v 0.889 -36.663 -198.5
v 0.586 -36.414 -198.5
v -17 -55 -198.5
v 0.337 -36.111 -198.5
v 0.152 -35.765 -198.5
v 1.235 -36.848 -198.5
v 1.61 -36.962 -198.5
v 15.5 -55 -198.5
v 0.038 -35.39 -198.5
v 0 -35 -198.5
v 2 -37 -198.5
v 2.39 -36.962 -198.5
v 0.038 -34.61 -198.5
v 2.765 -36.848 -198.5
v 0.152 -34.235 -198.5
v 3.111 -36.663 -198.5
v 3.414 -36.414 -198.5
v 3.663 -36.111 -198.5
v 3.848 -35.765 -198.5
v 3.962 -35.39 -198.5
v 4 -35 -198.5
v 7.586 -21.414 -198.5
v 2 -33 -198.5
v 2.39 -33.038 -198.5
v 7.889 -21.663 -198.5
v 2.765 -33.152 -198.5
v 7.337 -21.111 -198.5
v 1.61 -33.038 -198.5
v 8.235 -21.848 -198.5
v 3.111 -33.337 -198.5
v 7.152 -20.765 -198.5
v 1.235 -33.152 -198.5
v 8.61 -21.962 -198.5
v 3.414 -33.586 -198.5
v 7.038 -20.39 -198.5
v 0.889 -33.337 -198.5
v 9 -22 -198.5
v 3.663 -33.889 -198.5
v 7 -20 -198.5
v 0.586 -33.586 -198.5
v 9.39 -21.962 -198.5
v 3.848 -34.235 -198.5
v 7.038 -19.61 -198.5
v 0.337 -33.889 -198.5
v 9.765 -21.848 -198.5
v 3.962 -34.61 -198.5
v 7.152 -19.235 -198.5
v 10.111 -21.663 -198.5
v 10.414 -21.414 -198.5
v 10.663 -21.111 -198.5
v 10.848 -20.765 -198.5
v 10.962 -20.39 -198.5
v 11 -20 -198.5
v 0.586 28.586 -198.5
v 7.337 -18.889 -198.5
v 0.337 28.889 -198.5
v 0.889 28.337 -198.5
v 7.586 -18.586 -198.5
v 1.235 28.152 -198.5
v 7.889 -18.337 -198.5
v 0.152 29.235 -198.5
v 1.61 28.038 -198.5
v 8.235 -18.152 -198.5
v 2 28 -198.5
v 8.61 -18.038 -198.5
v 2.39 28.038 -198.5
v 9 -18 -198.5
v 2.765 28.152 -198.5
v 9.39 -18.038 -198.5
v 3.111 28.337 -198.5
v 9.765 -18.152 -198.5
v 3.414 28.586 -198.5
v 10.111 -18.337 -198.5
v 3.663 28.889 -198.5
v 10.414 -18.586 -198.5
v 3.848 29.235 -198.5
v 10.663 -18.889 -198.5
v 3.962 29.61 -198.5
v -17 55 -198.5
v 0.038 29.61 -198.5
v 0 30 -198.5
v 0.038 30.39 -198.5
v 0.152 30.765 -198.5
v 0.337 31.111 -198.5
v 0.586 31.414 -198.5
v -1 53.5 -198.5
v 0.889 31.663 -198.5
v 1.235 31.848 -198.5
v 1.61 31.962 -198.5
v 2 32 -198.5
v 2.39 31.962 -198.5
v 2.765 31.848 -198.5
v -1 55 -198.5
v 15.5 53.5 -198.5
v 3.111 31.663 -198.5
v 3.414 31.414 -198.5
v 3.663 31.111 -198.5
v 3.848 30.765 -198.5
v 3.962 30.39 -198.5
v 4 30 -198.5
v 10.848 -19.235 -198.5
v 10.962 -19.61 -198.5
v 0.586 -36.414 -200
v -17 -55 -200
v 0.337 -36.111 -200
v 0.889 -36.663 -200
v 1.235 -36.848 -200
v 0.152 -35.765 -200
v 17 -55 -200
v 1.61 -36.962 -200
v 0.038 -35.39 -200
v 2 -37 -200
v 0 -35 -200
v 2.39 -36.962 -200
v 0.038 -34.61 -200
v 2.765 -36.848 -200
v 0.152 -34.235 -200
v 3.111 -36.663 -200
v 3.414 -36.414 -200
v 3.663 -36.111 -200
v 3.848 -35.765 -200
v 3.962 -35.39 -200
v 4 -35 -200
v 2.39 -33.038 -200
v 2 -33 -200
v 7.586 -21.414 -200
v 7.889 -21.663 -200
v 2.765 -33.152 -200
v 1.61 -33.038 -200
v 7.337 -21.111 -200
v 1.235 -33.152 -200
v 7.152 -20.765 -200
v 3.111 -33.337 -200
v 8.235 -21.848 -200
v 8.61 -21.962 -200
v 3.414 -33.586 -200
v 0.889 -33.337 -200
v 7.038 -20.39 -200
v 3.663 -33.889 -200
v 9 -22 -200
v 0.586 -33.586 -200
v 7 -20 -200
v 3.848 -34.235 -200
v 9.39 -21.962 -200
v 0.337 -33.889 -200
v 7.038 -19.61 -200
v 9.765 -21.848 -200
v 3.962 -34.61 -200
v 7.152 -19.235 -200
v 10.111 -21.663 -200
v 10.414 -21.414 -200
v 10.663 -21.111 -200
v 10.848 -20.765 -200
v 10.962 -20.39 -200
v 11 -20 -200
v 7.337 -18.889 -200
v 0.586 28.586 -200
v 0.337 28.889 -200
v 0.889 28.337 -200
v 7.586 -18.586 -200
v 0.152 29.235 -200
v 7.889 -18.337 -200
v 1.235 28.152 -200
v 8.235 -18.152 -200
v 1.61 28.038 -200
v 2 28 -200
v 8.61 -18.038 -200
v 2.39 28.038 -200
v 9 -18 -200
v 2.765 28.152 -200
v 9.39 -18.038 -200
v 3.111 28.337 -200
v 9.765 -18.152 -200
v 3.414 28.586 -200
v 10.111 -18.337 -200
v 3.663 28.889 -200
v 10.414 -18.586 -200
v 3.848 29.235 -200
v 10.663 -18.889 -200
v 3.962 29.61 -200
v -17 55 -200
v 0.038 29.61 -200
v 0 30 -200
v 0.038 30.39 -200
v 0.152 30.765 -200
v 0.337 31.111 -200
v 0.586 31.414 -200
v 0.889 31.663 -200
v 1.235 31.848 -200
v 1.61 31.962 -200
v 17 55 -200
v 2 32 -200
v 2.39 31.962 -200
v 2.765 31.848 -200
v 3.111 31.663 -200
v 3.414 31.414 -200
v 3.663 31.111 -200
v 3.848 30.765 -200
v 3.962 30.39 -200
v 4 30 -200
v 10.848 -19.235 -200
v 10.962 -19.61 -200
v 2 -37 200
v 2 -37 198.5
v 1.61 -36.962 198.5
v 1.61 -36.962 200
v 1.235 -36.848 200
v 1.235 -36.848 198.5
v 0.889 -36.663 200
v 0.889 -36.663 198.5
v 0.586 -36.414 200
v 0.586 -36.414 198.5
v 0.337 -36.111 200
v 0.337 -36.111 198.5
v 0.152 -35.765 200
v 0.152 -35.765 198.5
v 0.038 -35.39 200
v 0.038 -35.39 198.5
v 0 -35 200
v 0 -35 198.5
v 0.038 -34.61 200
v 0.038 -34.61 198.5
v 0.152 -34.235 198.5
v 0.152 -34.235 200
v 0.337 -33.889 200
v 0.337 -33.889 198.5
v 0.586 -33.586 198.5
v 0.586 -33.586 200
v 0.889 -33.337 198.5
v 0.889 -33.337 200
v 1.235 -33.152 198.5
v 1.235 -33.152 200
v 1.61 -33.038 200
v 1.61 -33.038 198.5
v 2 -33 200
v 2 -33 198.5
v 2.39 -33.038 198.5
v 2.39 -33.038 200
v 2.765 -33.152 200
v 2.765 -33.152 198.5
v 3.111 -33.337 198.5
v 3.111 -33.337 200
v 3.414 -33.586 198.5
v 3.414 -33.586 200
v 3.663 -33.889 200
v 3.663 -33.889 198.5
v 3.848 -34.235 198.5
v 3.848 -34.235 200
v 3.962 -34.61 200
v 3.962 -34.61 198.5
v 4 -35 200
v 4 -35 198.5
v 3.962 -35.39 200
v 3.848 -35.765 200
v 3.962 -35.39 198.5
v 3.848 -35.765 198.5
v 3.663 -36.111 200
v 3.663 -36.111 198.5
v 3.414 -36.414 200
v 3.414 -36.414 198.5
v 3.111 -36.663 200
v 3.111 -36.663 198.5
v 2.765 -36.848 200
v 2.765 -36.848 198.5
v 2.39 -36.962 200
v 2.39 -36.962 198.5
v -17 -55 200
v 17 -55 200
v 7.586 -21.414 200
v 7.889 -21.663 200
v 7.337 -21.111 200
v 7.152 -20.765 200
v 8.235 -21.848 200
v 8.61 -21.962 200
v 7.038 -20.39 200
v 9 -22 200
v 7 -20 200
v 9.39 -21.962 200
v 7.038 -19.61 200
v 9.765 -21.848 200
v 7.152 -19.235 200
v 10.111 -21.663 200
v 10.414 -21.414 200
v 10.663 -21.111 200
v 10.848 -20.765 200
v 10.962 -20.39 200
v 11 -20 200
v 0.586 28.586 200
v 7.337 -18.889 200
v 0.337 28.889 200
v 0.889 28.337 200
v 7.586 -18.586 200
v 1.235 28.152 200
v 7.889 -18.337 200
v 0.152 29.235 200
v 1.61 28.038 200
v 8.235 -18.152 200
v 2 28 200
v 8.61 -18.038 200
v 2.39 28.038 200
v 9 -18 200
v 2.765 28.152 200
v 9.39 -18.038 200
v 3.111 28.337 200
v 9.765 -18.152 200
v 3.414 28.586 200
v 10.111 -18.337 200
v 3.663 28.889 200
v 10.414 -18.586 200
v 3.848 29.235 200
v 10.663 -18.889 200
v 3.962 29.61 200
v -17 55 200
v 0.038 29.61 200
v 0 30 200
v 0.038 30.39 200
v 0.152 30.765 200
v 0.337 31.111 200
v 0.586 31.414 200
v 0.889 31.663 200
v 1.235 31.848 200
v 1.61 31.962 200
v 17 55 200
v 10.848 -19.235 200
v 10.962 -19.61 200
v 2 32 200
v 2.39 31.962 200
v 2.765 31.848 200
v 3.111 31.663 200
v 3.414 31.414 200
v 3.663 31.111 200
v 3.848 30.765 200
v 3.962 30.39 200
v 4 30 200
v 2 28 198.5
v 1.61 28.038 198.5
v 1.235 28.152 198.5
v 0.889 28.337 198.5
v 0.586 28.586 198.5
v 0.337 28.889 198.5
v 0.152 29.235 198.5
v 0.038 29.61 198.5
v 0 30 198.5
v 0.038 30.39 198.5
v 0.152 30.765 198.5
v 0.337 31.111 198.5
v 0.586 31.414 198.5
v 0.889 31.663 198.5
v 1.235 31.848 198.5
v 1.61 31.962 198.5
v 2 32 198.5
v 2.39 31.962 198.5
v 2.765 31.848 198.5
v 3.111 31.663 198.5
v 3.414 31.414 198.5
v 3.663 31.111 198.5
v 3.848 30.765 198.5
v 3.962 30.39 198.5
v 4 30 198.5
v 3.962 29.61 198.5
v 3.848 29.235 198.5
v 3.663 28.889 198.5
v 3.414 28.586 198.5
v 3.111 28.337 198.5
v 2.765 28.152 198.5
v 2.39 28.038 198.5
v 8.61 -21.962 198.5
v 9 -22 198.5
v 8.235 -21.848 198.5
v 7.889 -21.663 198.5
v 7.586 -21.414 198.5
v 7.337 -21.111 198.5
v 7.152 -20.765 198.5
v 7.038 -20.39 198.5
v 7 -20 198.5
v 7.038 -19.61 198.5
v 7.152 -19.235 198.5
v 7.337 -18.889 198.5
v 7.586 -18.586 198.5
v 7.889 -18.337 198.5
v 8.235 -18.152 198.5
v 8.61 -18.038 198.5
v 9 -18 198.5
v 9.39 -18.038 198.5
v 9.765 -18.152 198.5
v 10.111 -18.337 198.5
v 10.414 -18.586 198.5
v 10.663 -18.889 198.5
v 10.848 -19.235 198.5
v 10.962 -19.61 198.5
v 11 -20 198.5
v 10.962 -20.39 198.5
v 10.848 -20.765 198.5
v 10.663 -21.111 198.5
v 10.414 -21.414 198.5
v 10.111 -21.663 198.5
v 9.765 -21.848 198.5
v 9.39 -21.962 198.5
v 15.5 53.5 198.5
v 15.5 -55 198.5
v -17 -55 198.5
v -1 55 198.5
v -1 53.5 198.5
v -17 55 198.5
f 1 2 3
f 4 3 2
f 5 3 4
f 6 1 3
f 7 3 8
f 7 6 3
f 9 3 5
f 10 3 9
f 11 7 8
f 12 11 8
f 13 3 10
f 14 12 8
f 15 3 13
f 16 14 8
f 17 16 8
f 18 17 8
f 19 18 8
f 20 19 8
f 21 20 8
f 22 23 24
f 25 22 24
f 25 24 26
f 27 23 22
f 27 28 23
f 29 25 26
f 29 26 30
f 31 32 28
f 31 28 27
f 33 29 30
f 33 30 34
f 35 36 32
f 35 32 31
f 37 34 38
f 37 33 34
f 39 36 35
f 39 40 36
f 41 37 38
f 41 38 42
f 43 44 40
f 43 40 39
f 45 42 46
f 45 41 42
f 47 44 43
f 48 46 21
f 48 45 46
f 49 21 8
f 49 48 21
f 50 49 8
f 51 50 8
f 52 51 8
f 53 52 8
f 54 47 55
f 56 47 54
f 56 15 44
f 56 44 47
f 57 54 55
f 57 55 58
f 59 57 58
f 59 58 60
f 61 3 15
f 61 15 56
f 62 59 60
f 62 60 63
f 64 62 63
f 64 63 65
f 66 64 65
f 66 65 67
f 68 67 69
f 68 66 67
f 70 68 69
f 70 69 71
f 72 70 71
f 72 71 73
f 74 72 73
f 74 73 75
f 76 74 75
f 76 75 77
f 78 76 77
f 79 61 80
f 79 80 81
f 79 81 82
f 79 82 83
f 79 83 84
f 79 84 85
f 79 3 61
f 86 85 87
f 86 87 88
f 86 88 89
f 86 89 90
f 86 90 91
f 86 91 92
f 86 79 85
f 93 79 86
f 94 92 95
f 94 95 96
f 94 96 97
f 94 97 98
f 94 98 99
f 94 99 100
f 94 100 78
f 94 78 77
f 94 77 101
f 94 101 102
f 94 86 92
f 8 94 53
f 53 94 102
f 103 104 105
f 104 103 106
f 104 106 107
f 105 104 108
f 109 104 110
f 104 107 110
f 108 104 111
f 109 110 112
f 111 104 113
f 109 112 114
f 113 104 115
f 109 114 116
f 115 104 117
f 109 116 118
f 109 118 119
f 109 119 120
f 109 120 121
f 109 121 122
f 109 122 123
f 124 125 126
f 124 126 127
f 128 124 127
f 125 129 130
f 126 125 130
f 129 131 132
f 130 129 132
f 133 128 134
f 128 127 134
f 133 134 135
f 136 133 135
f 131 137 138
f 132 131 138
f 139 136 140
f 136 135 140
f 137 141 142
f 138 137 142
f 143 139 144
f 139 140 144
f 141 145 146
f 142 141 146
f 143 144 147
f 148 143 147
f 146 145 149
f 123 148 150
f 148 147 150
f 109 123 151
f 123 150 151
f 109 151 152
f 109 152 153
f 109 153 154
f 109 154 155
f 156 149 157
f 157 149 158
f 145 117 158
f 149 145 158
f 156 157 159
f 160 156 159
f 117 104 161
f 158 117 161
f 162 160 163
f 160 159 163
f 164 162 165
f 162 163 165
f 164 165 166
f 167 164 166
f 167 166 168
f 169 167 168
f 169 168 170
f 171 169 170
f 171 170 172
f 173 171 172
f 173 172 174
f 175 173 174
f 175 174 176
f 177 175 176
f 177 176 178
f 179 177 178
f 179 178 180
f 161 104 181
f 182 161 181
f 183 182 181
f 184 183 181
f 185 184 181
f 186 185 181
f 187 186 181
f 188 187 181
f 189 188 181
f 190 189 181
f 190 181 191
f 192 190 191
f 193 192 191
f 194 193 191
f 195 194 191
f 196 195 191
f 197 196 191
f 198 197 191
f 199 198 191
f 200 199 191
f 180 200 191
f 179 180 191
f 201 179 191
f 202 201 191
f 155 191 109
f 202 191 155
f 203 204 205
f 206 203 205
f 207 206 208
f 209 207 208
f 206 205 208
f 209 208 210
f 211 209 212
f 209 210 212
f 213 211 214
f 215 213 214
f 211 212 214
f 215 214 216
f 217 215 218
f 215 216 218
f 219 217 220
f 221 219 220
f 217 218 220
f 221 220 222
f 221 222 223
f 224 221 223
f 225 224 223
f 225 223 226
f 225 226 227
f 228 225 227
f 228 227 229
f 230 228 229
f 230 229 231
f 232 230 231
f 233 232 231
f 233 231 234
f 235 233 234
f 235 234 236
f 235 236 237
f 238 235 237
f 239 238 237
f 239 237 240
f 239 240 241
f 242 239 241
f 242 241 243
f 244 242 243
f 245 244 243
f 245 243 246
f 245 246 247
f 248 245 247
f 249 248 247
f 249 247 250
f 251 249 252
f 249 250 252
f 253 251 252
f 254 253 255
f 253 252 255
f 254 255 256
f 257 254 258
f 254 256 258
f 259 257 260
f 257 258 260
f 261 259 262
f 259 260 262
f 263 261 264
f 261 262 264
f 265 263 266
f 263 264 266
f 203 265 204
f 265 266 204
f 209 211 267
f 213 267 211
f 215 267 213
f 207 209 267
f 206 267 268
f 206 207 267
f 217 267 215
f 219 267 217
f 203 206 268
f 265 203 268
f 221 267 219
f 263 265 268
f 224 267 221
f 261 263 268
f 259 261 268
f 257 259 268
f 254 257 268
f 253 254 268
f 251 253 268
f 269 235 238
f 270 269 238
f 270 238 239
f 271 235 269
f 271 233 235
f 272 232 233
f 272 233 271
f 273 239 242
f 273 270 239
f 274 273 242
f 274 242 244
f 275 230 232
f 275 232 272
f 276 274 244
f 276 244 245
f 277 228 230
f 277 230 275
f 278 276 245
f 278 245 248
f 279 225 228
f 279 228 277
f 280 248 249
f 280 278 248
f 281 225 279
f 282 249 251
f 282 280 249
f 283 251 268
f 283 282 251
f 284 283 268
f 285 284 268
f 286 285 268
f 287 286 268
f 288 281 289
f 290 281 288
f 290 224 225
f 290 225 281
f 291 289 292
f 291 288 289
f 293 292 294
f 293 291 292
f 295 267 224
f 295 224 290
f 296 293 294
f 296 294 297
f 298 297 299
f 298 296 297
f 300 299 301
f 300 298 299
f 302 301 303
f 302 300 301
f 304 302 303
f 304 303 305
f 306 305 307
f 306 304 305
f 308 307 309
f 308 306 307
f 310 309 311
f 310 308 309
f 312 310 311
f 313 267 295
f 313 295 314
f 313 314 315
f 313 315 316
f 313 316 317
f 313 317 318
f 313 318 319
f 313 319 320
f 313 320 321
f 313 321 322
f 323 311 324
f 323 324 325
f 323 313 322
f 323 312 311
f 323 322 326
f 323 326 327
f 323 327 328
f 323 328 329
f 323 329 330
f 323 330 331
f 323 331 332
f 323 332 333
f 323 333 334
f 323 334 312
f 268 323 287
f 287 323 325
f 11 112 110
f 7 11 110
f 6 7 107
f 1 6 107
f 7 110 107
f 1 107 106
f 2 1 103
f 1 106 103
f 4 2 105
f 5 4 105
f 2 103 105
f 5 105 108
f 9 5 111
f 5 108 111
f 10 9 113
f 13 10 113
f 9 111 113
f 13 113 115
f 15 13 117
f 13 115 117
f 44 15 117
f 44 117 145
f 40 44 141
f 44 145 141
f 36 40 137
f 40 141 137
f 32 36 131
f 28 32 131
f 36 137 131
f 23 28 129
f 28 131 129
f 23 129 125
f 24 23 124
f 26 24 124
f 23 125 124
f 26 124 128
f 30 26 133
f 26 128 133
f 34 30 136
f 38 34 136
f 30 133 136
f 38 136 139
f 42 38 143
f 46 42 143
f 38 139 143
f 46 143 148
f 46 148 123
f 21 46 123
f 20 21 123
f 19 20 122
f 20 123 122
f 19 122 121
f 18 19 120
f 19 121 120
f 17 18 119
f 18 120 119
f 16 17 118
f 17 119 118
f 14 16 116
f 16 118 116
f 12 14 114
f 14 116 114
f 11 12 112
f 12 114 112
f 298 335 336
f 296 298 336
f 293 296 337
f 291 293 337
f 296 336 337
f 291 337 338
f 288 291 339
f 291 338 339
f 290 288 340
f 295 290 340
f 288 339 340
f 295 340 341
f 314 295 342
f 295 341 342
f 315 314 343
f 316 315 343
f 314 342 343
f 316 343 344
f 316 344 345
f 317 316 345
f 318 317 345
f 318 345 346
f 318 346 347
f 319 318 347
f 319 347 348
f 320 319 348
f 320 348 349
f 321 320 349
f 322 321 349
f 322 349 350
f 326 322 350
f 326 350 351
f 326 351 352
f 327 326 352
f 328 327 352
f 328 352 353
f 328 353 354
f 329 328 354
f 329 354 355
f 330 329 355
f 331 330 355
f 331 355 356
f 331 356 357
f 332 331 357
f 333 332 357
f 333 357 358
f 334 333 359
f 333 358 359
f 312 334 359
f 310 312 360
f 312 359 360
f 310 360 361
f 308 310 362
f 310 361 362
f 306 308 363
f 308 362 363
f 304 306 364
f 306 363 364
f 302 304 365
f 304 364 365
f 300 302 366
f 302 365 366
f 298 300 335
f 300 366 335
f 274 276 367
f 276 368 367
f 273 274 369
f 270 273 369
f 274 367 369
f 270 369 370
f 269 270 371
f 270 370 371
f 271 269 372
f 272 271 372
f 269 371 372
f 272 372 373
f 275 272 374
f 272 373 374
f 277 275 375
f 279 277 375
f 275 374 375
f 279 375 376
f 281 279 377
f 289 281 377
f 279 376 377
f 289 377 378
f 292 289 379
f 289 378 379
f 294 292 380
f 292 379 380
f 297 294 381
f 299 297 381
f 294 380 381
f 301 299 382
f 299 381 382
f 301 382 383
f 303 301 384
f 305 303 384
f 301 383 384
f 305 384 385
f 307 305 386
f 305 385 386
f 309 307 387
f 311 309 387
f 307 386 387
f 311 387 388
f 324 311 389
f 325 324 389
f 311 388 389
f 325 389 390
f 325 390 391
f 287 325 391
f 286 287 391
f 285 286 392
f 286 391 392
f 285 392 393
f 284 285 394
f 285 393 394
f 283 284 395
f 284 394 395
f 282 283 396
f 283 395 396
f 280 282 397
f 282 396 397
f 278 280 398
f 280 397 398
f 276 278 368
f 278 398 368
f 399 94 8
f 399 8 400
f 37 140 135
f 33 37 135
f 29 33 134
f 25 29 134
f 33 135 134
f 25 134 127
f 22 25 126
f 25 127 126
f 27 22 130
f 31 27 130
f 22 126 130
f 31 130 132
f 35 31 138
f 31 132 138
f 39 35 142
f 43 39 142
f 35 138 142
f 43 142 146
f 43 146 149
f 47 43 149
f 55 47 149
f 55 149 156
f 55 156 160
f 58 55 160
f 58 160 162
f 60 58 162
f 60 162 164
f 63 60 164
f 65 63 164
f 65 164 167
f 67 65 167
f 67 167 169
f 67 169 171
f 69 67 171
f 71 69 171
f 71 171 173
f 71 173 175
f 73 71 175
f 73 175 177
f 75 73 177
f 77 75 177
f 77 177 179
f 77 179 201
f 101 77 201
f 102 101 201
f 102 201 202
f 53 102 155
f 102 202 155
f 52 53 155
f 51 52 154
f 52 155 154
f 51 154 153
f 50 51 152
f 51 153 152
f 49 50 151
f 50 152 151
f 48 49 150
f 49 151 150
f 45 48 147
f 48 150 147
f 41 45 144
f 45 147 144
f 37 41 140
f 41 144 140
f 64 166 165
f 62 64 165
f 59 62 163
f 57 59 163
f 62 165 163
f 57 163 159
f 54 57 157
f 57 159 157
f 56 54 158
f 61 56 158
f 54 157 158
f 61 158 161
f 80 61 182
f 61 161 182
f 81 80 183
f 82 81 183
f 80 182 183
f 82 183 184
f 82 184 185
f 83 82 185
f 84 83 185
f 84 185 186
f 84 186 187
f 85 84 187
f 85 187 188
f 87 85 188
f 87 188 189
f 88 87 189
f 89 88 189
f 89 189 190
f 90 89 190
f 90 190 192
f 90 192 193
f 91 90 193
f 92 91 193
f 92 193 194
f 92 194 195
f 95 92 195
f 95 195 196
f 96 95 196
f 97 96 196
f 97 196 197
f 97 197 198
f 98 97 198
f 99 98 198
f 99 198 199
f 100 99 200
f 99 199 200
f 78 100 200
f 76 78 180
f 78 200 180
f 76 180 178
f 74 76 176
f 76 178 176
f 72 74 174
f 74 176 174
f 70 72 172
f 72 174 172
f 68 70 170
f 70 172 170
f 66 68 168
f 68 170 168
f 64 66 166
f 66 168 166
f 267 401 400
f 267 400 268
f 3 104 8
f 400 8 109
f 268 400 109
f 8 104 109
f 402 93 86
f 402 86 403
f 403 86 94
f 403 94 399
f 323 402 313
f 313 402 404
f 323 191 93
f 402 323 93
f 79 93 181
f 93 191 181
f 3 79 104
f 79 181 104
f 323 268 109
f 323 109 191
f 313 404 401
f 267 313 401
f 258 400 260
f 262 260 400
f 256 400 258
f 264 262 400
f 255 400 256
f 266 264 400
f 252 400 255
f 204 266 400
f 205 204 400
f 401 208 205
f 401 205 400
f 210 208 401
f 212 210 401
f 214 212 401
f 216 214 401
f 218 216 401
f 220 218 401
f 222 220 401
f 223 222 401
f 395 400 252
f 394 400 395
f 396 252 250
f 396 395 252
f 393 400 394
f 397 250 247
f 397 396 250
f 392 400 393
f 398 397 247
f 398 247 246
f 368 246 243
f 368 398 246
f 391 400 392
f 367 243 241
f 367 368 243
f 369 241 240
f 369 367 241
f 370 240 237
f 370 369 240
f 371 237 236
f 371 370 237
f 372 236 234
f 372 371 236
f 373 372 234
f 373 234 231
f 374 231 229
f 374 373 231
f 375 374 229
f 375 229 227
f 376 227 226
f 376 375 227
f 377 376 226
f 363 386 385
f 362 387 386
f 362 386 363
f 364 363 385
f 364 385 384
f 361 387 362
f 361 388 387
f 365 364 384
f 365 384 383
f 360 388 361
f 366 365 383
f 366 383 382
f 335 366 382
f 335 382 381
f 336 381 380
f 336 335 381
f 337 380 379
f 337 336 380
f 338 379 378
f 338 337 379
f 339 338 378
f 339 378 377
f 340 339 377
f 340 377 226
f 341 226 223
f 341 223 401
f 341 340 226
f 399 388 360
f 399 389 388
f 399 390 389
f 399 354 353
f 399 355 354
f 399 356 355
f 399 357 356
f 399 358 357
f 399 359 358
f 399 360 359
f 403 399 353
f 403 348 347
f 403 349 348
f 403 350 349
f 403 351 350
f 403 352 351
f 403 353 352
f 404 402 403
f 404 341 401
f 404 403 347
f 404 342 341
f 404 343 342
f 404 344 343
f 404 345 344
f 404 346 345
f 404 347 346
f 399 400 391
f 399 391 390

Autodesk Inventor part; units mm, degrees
ref_plane "YZ Plane" through (0, 0, 0) normal (1, 0, 0) x (0, 1, 0)
ref_plane "XZ Plane" through (0, 0, 0) normal (0, 1, 0) x (-1, 0, 0)
ref_plane "XY Plane" through (0, 0, 0) normal (0, 0, 1) x (1, 0, 0)
sketch "Skizze1" plane through (0, 0, 0) normal (0, 0, 1) x (1, 0, 0)
  line L0 (-17, -55) -> (17, -55)
  line L1 (17, -55) -> (17, 55)
  line L2 (17, 55) -> (-17, 55)
  line L3 (-17, 55) -> (-17, -55)
  line L4 (-17, 55) -> (17, -55) construction
  line L5 (-17, -55) -> (17, 55) construction
  point P0 (0, 0)
  point P1 (0, 0)
  dimension "d0" = 34
  dimension "d2" = 110
extrude "Extrusion1" add sketch "Skizze1" along normal mid plane 400
sketch "Skizze2" plane through (0, 0, 200) normal (0, 0, 1) x (1, 0, 0)
  line L0 (-17, -55) -> (17, -55) projected
  line L1 (17, -55) -> (17, 55) projected
  line L2 (17, 55) -> (-17, 55) projected
  point P0 (0, 0)
  point P1 (2, 30)
  point P2 (9, -20)
  point P3 (2, -35)
  dimension "d5" = 25
  dimension "d6" = 15
  dimension "d30" = 50
  dimension "d31" = 8
  dimension "d32" = 7
  dimension "d33" = 35
  dimension "d40" = 20
  dimension "d41" = 15
hole "Bohrung1" at (2, 30, 200) at (9, -20, 200) at (2, -35, 200) direction (0, 0, -1) diameter 4 end through all
sketch "Skizze4" plane through (-17, -55, 200) normal (-1, 0, 0) x (0, 0, 1)
  line L0 (0, 0) -> (-400, 0) projected
  line L1 (0, 110) -> (0, 0) projected
  line L2 (-400, 110) -> (0, 110) projected
  line L3 (-400, 0) -> (-400, 110) projected
  line L4 (-398.5, 108.5) -> (-1.5, 108.5)
  line L5 (-1.5, 108.5) -> (-1.5, 0)
  line L6 (-1.5, 0) -> (-398.5, 0)
  line L7 (-398.5, 0) -> (-398.5, 108.5)
  point P0 (-200, 55)
  dimension "d34" = 1.5
  dimension "d35" = 0
  dimension "d36" = 1.5
  dimension "d37" = 1.5
extrude "Extrusion2" cut sketch "Skizze4" against normal blind 32.5 contours L0 L7 L4 L5
sketch "Skizze5" plane through (-17, 55, 200) normal (0, 1, 0) x (1, 0, 0)
  line L0 (34, 0) -> (0, 0) projected
  line L1 (34, 400) -> (34, 0) projected
  line L2 (0, 400) -> (34, 400) projected
  line L3 (0, 398.5) -> (16, 398.5)
  line L4 (16, 398.5) -> (16, 1.5)
  line L5 (16, 1.5) -> (0, 1.5)
  line L6 (0, 1.5) -> (0, 398.5)
  point P0 (17, 200)
  dimension "d42" = 1.5
  dimension "d43" = 1.5
  dimension "d44" = 18
extrude "Extrusion3" cut sketch "Skizze5" against normal blind 32.5
properties part number "bewegliche achse horizontal" material "Stahl"
